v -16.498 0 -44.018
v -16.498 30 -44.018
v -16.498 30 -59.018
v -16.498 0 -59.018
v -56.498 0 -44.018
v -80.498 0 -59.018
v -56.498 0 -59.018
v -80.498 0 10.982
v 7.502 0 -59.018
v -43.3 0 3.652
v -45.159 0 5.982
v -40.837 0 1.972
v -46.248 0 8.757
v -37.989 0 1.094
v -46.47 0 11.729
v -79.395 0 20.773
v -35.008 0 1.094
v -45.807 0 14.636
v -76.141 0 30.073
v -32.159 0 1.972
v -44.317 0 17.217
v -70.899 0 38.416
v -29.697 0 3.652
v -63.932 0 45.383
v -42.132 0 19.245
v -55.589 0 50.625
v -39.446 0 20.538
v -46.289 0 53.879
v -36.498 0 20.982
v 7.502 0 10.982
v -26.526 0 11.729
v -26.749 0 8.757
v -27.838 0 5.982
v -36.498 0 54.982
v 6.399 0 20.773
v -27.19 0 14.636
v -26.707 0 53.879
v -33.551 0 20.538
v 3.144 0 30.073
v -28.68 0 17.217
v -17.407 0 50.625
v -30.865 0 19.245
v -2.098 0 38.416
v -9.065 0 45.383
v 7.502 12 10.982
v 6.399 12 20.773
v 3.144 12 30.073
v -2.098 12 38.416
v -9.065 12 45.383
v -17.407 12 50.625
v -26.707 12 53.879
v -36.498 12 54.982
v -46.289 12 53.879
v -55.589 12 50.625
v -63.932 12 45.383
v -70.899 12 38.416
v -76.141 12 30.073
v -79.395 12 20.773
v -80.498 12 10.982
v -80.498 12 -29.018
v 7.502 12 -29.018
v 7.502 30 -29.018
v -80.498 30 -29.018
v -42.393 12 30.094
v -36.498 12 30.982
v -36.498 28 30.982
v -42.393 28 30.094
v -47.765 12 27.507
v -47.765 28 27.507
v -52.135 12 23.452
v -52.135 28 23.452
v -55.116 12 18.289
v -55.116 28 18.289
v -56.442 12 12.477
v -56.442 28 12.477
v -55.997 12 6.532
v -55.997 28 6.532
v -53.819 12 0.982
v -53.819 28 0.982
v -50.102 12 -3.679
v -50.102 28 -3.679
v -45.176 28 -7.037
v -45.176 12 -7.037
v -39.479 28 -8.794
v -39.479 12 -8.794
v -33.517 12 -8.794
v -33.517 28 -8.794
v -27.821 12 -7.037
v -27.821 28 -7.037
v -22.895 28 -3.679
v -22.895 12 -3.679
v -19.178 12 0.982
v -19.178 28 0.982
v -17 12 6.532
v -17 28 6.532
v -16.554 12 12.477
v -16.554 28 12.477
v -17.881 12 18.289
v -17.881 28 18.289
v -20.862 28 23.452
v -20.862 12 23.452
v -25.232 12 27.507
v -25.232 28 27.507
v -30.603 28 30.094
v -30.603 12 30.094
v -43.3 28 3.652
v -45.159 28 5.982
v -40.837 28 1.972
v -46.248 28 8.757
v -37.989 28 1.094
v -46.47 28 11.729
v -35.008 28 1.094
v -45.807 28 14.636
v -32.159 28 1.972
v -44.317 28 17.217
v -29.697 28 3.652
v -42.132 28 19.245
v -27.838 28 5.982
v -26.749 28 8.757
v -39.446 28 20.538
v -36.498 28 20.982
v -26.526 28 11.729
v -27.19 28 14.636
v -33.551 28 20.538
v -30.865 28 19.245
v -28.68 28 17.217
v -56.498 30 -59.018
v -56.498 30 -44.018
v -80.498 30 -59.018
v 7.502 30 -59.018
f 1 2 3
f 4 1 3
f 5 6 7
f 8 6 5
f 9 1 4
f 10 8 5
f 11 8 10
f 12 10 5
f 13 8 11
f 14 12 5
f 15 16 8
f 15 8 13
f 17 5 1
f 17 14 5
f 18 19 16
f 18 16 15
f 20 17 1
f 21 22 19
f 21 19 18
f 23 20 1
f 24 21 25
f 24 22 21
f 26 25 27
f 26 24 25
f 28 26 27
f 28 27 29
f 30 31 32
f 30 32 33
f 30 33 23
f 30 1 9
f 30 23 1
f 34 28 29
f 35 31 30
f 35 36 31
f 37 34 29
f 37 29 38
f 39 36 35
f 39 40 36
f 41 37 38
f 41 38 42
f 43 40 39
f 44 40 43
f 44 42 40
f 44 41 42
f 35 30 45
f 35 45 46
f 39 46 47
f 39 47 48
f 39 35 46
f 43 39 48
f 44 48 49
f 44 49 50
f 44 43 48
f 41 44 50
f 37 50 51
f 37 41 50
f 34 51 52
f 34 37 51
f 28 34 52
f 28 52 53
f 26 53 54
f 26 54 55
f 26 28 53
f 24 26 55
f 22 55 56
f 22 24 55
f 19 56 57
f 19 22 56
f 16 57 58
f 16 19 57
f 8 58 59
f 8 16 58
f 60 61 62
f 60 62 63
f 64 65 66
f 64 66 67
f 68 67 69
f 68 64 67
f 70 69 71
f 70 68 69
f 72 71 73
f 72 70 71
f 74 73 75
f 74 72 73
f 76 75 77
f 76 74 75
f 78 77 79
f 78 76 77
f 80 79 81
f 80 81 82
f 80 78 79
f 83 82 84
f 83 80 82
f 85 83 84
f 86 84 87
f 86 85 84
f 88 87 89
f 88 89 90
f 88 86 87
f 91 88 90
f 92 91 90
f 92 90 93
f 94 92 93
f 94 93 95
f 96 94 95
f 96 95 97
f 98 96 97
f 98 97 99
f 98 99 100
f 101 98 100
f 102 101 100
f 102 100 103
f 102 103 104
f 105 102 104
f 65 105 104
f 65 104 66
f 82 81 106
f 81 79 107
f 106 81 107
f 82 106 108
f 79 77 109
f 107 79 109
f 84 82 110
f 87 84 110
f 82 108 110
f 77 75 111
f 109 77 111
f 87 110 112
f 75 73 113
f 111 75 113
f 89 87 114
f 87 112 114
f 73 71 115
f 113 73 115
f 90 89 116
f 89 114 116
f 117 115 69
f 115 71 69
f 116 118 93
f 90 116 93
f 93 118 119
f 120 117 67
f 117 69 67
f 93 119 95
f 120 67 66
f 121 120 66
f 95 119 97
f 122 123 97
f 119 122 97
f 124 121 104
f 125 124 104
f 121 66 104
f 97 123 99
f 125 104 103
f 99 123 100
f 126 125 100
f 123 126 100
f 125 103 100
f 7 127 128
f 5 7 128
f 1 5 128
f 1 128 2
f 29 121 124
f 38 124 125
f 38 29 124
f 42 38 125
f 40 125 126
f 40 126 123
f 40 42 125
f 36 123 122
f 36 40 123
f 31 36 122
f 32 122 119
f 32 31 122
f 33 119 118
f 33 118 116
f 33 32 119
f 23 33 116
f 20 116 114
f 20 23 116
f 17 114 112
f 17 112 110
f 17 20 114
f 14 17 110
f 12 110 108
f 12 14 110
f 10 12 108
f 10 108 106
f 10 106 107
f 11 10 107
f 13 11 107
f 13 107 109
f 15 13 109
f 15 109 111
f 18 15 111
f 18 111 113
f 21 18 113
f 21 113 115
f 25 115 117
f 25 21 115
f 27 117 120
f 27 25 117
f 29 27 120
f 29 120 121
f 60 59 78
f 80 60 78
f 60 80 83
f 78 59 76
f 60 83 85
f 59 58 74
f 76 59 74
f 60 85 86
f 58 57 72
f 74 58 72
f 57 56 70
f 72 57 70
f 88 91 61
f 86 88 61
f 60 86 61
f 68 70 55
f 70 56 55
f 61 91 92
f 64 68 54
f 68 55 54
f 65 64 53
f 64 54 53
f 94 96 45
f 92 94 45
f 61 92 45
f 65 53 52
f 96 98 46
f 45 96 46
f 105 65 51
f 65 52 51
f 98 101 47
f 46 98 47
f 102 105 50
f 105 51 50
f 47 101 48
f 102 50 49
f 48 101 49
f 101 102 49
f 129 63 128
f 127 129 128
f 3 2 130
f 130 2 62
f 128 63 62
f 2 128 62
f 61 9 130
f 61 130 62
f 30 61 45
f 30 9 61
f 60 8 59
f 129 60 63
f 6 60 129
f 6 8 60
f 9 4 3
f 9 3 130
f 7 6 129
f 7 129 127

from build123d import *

# Parameters (mm, degrees)
F1_DEPTH = 30
F2_DEPTH = 12
F3_DEPTH = 28


with BuildPart() as f1:
    # F0 (on Front) → F1 (new body)
    with BuildSketch(Plane.XZ):
        Polygon((-36.498324, -29.017857), (-80.498324, -29.017857), (-80.498324, -59.017857), (-56.498324, -59.017857), (-56.498324, -44.017857), (-36.498324, -44.017857), (-16.498324, -44.017857), (-16.498324, -59.017857), (7.501676, -59.017857), (7.501676, -29.017857), align=None)
    extrude(amount=-F1_DEPTH)

    # F0 (on Front) → F2 (join)
    with BuildSketch(Plane.XZ):
        with BuildLine():
            ThreePointArc((7.501676, 10.982143), (-5.385626, 42.094841), (-36.498324, 54.982143))
            ThreePointArc((-36.498324, 54.982143), (-67.611023, 42.094841), (-80.498324, 10.982143))
            Line((-80.498324, 10.982143), (-80.498324, -29.017857))
            Line((-80.498324, -29.017857), (-36.498324, -29.017857))
            Line((-36.498324, -29.017857), (7.501676, -29.017857))
            Line((7.501676, -29.017857), (7.501676, 10.982143))
        make_face()
        with BuildLine():
            ThreePointArc((-36.498324, -9.017857), (-56.498324, 10.982143), (-36.498324, 30.982143))
            ThreePointArc((-36.498324, 30.982143), (-16.498324, 10.982143), (-36.498324, -9.017857))
        make_face(mode=Mode.SUBTRACT)
    extrude(amount=-F2_DEPTH)

    # F0 (on Front) → F3 (join)
    with BuildSketch(Plane.XZ):
        with BuildLine():
            ThreePointArc((-36.498324, -9.017857), (-16.498324, 10.982143), (-36.498324, 30.982143))
            ThreePointArc((-36.498324, 30.982143), (-56.498324, 10.982143), (-36.498324, -9.017857))
        make_face()
        with BuildLine():
            ThreePointArc((-36.498324, 0.982143), (-46.498324, 10.982143), (-36.498324, 20.982143))
            ThreePointArc((-36.498324, 20.982143), (-26.498324, 10.982143), (-36.498324, 0.982143))
        make_face(mode=Mode.SUBTRACT)
    extrude(amount=-F3_DEPTH)


solid = f1.part
